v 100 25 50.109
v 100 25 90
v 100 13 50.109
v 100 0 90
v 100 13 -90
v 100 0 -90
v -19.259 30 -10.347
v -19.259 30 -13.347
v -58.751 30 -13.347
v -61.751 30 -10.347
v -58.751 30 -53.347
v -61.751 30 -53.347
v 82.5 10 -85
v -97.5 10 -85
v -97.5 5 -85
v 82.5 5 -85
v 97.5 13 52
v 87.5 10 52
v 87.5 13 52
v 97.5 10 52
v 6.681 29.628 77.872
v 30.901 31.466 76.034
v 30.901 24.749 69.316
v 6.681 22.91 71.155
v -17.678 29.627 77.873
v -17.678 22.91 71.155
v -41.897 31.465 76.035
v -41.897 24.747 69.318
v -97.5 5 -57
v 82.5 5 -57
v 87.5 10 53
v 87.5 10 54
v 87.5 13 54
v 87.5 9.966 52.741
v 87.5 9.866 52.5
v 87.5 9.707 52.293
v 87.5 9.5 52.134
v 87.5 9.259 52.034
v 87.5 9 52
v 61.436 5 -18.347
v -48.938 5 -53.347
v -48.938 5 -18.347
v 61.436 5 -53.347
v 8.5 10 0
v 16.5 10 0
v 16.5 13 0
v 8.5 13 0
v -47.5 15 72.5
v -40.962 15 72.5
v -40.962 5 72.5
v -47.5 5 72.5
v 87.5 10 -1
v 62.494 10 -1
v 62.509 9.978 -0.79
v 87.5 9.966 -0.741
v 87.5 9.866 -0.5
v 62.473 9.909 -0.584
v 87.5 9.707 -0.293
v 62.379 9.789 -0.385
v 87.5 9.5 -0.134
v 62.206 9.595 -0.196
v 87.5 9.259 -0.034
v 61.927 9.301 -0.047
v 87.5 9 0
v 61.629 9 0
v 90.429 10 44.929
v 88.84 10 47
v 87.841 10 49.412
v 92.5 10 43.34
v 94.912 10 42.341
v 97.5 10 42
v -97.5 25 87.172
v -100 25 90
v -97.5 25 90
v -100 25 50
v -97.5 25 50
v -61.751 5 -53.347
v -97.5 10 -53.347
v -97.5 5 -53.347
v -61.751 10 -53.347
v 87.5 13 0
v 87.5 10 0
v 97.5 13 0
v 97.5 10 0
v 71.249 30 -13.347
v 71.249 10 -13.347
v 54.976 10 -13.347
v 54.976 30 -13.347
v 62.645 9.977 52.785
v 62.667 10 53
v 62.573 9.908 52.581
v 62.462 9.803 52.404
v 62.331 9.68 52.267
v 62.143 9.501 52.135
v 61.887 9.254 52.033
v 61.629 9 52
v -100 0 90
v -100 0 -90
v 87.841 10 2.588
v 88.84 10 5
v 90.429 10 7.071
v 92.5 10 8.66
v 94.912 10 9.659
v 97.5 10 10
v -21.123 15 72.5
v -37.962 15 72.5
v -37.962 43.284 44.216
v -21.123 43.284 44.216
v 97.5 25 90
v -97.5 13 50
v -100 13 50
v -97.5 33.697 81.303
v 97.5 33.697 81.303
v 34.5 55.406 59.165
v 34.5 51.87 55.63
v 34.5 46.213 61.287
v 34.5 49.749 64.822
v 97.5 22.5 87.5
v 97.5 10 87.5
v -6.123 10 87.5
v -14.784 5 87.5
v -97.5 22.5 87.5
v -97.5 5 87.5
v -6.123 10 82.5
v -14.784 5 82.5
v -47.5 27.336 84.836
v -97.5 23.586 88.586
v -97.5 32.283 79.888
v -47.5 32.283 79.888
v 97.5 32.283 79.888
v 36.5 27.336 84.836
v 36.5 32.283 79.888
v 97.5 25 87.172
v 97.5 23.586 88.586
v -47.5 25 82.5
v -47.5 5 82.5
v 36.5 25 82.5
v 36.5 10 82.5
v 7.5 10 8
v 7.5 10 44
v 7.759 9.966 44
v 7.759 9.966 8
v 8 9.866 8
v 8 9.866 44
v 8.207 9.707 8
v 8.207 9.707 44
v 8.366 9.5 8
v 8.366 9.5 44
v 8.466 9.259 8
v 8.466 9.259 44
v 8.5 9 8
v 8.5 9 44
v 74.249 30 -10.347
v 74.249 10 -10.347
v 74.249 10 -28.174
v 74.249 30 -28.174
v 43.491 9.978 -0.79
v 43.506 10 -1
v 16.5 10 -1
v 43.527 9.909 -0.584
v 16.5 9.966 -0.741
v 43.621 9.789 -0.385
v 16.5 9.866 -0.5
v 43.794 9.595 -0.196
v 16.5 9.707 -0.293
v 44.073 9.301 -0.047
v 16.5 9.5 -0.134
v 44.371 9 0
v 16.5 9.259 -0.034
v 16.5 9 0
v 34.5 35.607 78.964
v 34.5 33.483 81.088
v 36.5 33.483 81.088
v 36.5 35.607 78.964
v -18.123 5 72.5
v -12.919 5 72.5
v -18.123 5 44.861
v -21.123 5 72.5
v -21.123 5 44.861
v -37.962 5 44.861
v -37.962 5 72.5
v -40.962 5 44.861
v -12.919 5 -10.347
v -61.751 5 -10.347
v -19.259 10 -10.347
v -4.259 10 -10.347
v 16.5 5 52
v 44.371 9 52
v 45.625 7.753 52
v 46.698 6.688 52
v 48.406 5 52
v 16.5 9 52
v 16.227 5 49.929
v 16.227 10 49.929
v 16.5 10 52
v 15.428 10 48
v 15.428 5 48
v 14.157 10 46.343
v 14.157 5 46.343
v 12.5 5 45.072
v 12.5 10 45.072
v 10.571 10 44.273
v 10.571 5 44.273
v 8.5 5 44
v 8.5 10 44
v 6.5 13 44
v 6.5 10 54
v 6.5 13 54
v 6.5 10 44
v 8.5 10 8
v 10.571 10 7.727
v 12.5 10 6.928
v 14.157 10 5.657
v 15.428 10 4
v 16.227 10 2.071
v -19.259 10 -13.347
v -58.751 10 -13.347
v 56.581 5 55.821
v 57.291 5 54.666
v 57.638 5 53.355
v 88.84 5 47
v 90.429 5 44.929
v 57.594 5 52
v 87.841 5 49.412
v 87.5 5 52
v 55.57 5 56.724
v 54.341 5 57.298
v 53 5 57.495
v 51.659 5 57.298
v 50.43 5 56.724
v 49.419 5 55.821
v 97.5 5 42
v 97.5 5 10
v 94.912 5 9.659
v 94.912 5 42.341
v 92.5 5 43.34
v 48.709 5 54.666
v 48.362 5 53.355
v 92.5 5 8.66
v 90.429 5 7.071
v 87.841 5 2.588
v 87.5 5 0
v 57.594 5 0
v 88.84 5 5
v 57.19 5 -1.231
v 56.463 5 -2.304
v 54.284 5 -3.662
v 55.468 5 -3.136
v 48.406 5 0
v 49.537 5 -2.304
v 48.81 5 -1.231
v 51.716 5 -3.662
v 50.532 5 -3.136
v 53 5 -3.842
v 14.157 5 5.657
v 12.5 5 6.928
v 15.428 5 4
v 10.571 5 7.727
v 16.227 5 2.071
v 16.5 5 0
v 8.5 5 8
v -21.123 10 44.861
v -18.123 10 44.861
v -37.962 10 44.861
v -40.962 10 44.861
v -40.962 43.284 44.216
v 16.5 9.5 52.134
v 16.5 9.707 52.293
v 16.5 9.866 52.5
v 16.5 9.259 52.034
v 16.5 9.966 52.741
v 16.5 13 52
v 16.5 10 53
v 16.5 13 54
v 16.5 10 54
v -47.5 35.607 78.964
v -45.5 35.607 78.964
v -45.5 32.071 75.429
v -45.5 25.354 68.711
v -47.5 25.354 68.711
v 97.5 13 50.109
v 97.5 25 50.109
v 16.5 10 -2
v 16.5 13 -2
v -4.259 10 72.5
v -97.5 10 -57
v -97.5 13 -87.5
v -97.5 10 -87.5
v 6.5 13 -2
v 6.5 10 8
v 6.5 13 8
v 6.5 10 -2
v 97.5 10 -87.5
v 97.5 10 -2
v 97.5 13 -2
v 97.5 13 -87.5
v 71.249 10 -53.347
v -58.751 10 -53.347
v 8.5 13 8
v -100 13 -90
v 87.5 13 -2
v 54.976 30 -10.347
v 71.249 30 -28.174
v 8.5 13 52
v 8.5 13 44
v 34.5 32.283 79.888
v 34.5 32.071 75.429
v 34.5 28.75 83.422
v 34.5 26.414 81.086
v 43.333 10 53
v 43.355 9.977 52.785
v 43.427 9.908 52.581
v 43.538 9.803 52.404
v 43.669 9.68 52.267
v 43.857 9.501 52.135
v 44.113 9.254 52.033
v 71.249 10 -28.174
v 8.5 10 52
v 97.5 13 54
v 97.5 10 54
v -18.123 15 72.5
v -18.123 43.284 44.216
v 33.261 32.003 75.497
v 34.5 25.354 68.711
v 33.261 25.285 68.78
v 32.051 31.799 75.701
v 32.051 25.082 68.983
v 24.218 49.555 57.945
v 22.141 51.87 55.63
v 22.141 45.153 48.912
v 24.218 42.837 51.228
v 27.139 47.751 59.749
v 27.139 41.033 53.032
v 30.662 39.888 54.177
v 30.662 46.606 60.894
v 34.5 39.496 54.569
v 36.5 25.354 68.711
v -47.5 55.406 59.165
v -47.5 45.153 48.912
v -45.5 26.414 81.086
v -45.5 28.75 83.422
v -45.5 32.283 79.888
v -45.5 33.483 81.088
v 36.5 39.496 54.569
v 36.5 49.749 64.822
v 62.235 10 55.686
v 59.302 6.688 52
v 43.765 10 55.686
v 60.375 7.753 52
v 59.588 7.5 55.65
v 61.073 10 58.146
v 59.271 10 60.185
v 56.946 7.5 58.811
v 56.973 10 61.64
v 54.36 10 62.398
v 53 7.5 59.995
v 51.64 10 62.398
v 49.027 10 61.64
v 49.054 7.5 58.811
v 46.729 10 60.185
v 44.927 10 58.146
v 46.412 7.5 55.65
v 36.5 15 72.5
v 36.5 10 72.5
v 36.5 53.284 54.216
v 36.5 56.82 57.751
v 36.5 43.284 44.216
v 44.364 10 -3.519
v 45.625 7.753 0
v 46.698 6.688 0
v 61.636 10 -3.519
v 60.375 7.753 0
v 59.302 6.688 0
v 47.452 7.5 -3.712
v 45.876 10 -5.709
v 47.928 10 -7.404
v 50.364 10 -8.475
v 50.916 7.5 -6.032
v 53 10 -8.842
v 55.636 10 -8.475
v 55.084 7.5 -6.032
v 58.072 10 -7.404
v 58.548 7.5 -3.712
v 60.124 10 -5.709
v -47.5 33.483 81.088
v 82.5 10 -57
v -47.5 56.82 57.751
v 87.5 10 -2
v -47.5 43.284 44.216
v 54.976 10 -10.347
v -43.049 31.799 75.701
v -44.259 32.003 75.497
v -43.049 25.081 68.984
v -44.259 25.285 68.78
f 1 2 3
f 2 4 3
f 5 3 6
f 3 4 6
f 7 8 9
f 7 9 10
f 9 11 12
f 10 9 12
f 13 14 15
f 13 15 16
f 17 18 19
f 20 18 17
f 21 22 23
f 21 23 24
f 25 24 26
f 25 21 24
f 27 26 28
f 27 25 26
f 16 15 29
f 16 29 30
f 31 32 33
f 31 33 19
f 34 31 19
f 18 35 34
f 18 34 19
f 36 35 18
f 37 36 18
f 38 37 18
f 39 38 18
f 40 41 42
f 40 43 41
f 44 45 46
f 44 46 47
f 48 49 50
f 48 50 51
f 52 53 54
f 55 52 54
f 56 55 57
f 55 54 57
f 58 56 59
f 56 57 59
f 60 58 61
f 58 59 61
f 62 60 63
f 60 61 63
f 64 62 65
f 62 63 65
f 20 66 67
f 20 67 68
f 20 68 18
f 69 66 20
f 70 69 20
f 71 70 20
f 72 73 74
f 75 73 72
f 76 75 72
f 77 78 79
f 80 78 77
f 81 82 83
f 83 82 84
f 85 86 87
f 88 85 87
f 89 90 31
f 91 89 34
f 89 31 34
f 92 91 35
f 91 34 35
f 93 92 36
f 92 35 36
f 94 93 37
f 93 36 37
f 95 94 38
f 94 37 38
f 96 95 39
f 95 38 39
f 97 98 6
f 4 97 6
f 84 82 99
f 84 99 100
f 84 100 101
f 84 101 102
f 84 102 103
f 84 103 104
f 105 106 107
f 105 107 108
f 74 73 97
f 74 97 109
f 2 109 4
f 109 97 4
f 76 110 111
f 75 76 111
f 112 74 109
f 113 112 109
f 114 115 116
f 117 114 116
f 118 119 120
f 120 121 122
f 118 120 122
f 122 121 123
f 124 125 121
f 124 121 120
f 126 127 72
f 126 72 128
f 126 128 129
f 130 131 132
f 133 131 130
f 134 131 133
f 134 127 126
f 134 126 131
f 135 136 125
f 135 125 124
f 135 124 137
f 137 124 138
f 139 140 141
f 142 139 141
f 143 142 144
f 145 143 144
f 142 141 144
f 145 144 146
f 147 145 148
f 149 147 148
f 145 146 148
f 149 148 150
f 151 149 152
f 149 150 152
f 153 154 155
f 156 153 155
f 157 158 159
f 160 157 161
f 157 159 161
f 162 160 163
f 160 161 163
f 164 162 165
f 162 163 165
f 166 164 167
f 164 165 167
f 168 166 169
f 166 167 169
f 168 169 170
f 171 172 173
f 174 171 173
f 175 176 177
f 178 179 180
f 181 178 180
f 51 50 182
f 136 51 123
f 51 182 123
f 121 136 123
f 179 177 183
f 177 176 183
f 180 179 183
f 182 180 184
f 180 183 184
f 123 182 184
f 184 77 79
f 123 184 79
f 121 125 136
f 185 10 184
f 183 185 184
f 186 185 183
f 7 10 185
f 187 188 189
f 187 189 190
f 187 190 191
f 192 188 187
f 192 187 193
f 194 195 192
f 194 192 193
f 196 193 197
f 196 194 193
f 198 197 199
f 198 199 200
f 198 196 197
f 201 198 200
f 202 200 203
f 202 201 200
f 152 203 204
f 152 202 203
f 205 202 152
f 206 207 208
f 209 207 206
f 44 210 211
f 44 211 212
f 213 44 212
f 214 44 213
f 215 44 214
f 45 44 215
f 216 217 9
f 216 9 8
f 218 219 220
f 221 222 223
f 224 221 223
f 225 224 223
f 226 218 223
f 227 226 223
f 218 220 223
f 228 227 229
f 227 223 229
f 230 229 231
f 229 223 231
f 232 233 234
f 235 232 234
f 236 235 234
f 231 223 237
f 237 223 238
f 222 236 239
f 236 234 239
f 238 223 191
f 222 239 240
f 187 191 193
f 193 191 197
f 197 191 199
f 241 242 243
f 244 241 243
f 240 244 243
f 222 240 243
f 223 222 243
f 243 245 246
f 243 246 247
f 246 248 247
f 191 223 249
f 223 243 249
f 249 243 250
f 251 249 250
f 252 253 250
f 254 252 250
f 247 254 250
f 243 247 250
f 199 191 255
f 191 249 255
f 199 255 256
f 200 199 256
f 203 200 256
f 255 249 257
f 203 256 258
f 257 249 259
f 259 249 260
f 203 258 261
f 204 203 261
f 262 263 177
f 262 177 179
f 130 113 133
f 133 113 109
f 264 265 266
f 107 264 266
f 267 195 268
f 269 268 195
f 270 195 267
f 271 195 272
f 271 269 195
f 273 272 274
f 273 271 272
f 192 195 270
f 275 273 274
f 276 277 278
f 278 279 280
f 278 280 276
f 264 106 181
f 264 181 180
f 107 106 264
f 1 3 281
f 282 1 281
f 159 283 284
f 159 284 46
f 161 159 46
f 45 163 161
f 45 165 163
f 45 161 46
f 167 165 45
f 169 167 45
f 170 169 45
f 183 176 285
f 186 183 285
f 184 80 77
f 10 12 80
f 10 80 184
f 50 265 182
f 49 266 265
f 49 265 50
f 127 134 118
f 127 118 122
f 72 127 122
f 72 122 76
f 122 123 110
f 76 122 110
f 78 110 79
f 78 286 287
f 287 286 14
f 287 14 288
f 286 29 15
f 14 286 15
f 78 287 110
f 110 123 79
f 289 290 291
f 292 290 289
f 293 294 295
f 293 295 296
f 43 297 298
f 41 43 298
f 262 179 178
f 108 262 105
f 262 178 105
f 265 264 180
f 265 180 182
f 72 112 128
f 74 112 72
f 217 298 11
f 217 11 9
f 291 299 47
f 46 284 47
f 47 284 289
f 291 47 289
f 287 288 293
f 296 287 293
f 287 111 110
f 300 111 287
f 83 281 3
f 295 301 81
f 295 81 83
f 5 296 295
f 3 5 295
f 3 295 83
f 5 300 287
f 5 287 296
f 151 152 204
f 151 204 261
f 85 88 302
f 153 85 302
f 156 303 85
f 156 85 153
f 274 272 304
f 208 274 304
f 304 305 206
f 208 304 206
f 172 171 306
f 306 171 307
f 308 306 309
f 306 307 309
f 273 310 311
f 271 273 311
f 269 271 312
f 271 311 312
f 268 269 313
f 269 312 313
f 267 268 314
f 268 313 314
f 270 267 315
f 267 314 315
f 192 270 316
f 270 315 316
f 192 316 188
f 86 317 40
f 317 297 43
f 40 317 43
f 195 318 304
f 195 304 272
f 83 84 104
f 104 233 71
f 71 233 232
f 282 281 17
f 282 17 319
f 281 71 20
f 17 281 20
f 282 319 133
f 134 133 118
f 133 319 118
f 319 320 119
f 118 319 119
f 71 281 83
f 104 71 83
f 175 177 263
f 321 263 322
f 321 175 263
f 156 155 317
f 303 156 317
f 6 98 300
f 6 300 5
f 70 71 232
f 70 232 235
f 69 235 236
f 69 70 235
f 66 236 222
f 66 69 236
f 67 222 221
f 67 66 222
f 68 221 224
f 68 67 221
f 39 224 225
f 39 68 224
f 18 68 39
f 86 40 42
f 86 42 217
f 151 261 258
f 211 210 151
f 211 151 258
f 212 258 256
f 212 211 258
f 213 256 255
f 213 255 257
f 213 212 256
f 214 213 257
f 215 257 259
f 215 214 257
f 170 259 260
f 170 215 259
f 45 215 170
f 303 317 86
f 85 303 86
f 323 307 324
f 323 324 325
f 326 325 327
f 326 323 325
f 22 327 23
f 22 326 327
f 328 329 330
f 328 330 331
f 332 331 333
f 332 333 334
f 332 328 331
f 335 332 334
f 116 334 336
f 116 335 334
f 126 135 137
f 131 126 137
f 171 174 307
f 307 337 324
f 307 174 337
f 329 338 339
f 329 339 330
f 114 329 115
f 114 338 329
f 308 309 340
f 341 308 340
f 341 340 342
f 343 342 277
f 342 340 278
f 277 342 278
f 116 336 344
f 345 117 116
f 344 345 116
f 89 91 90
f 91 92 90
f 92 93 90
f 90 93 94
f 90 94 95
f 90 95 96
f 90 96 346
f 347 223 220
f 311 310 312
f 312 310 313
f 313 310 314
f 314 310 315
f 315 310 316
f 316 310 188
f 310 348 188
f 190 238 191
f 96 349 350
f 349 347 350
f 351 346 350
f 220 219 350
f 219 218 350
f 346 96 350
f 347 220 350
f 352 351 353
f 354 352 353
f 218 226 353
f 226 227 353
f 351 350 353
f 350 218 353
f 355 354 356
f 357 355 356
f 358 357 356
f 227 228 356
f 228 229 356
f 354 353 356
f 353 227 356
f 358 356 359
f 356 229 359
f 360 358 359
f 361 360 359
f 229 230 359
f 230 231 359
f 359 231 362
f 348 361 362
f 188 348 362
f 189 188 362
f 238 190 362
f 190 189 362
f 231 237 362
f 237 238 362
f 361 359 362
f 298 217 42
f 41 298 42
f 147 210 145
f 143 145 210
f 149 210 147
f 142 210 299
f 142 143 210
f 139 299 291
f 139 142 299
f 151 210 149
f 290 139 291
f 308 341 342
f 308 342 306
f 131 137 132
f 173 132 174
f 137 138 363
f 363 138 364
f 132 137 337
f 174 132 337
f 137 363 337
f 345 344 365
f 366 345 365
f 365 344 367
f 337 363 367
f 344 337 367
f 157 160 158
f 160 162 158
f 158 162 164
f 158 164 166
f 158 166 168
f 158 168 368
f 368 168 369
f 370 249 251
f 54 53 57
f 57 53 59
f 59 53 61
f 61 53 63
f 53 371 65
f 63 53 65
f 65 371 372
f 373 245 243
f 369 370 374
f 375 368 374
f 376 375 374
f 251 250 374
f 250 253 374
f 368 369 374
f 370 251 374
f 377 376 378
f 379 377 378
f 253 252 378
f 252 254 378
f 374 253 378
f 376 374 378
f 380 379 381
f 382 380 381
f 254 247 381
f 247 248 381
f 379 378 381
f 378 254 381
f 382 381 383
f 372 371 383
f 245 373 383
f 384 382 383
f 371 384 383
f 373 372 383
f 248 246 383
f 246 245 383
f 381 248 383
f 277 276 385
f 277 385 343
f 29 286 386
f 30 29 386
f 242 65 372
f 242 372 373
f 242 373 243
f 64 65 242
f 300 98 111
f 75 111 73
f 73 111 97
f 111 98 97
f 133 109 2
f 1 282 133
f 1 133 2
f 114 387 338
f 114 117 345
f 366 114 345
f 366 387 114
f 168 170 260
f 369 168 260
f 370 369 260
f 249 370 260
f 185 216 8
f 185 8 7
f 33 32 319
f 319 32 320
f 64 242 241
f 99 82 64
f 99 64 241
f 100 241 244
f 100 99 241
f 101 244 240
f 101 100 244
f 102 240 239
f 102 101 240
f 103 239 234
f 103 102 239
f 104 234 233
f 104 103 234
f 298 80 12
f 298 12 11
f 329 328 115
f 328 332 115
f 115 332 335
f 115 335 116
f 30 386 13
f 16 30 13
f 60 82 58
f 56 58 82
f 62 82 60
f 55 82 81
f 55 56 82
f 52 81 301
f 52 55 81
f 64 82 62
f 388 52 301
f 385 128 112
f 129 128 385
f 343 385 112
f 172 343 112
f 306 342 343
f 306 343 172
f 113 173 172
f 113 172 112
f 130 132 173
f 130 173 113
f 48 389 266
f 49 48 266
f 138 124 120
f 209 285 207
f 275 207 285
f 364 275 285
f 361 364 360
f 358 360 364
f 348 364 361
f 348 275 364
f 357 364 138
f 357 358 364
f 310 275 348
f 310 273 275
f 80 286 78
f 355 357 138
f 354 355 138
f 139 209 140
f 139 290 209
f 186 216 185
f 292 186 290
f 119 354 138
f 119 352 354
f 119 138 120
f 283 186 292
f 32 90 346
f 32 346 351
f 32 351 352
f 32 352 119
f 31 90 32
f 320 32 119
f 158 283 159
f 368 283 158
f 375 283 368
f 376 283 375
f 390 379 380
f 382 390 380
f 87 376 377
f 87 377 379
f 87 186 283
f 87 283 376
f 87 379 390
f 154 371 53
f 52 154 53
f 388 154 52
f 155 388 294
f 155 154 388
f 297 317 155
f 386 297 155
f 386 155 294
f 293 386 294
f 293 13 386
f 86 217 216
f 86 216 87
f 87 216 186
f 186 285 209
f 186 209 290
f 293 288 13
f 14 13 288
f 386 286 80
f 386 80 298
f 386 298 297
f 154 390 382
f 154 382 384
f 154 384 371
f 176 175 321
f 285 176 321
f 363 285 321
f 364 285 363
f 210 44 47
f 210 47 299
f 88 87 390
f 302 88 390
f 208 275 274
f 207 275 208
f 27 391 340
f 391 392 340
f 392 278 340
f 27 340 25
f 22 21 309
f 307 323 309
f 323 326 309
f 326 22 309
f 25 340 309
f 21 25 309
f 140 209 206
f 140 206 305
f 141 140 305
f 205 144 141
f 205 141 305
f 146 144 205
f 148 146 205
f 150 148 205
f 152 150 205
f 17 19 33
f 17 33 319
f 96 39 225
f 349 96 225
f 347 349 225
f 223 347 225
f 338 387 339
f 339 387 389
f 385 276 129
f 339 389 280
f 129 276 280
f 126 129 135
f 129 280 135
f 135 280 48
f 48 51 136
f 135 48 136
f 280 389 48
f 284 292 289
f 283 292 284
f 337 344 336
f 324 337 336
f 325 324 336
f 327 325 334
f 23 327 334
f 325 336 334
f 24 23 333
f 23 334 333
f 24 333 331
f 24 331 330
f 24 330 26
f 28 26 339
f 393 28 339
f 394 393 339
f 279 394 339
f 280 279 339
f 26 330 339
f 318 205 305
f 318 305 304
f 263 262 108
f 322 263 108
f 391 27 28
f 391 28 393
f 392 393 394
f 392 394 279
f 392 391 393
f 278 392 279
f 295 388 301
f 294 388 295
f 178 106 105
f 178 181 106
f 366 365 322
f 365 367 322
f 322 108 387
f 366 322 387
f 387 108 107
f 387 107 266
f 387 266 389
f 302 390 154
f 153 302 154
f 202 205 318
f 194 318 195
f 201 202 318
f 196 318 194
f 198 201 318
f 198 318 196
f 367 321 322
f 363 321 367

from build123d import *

# Parameters (mm, degrees)
SKETCH1_W            = 200
SKETCH1_H            = 180
BOSS_EXTRUDE1_DEPTH  = 10
SKETCH2_W            = 200
SKETCH2_H            = 180
SKETCH2_W_2          = 195
SKETCH2_H_2          = 175
BOSS_EXTRUDE2_DEPTH  = 3
SKETCH11_W           = 180
SKETCH11_H           = 28
CUT_EXTRUDE4_DEPTH   = 8
BOSS_EXTRUDE6_DEPTH  = 20
SKETCH4_W            = 10
SKETCH4_H            = 2
BOSS_EXTRUDE3_DEPTH  = 3
CUT_EXTRUDE1_DEPTH   = 5
CHAMFER1_SIZE        = 5
FILLET1_R            = 1
SKETCH7_W            = 84
SKETCH7_H            = 10
BOSS_EXTRUDE4_DEPTH  = 15
CHAMFER2_SIZE        = 10
SKETCH8_W            = 84
SKETCH8_H            = 14.142135624
BOSS_EXTRUDE5_DEPTH  = 40
BOSS_EXTRUDE12_DEPTH = 5
CUT_EXTRUDE5_DEPTH   = 9.5
LOFT2_START          = -40.961892057
LOFT2_DEPTH          = 3
LOFT3_START          = 61.722133944
LOFT3_OUTLINE_W      = 3
LOFT3_OUTLINE_H      = 43.678858874
LOFT3_DEPTH          = 4.277866056
LOFT5_START          = -40.961892057
LOFT5_DEPTH          = 3
LOFT6_START          = -21.123339187
LOFT6_DEPTH          = 3
SKETCH32_W           = 110
SKETCH32_H           = 35
CUT_EXTRUDE6_DEPTH   = 5
CHAMFER6_START       = -10.346513917
CHAMFER6_DEPTH       = 82.846513917
CHAMFER6_2_OUTLINE_W = 1.135860263
CHAMFER6_2_OUTLINE_H = 5
CHAMFER6_2_DEPTH     = 55.207581741
CHAMFER6_START_2     = 82.5
CHAMFER6_3_DEPTH     = 5
CHAMFER8_SIZE        = 5
BOSS_EXTRUDE13_DEPTH = 12
CHAMFER5_SIZE        = 2.5
SKETCH25_W           = 195
SKETCH25_H           = 2
BOSS_EXTRUDE14_DEPTH = 12.3
BOSS_EXTRUDE15_DEPTH = 10


with BuildPart() as part:
    # Sketch1 → Boss-Extrude1 (new body)
    with BuildSketch(Plane(origin=(0, 0, 0), x_dir=(1, 0, 0), z_dir=(0, 1, 0))):
        Rectangle(SKETCH1_W, SKETCH1_H)
    extrude(amount=BOSS_EXTRUDE1_DEPTH)

    # Sketch2 → Boss-Extrude2 (add)
    with BuildSketch(Plane(origin=(0, 10, 0), x_dir=(1, 0, 0), z_dir=(0, 1, 0))):
        Rectangle(SKETCH2_W, SKETCH2_H)
        Rectangle(SKETCH2_W_2, SKETCH2_H_2, mode=Mode.SUBTRACT)
    extrude(amount=BOSS_EXTRUDE2_DEPTH)

    # Sketch11 → Cut-Extrude4 (cut)
    with BuildSketch(Plane(origin=(0, 13, 0), x_dir=(1, 0, 0), z_dir=(0, 1, 0))):
        with Locations((-7.5, 71)):
            Rectangle(SKETCH11_W, SKETCH11_H)
    extrude(amount=-CUT_EXTRUDE4_DEPTH, mode=Mode.SUBTRACT)

    # Sketch12 → Boss-Extrude6 (add)
    with BuildSketch(Plane(origin=(0, 10, 0), x_dir=(1, 0, 0), z_dir=(0, 1, 0))):
        Polygon((-58.75108786, 53.346513917), (-58.75108786, 13.346513917), (-19.25919945, 13.346513917), (-19.25919945, 10.346513917), (-61.75108786, 10.346513917), (-61.75108786, 53.346513917), align=None)
        Polygon((71.24891214, 28.173917959), (71.24891214, 13.346513917), (54.976322897, 13.346513917), (54.976322897, 10.346513917), (74.24891214, 10.346513917), (74.24891214, 28.173917959), align=None)
    extrude(amount=BOSS_EXTRUDE6_DEPTH)

    # Sketch4 → Boss-Extrude3 (add)
    with BuildSketch(Plane(origin=(0, 10, 0), x_dir=(1, 0, 0), z_dir=(0, 1, 0))):
        Polygon((8.5, 0), (8.5, -8), (6.5, -8), (6.5, 2), (16.5, 2), (16.5, 0), align=None)
        Polygon((16.5, -52), (16.5, -54), (6.5, -54), (6.5, -44), (8.5, -44), (8.5, -52), align=None)
        with Locations((92.5, 1)):
            Rectangle(SKETCH4_W, SKETCH4_H)
        with Locations((92.5, -53)):
            Rectangle(SKETCH4_W, SKETCH4_H)
    extrude(amount=BOSS_EXTRUDE3_DEPTH)

    # Sketch5 → Cut-Extrude1 (cut)
    with BuildSketch(Plane(origin=(0, 10, 0), x_dir=(1, 0, 0), z_dir=(0, 1, 0))):
        with BuildLine():
            Line((16.5, 0), (48.405541733, 0))
            ThreePointArc((48.405541733, 0), (53, 3.841715626), (57.594458267, 0))
            Line((57.594458267, 0), (87.5, 0))
            ThreePointArc((87.5, 0), (90.428932188, -7.071067812), (97.5, -10))
            Line((97.5, -10), (97.5, -42))
            ThreePointArc((97.5, -42), (90.428932188, -44.928932188), (87.5, -52))
            Line((87.5, -52), (57.594458267, -52))
            ThreePointArc((57.594458267, -52), (53, -57.494692689), (48.405541733, -52))
            Line((48.405541733, -52), (16.5, -52))
            ThreePointArc((16.5, -52), (14.156854249, -46.343145751), (8.5, -44))
            Line((8.5, -44), (8.5, -8))
            ThreePointArc((8.5, -8), (14.156854249, -5.656854249), (16.5, 0))
        make_face()
    extrude(amount=-CUT_EXTRUDE1_DEPTH, mode=Mode.SUBTRACT)

    # Chamfer1
    chamfer1_edges = [part.edges().sort_by_distance(p)[0] for p in [
        (53, 10, -3.841715626),
        (53, 10, 57.494692689),
    ]]
    chamfer(chamfer1_edges, length=CHAMFER1_SIZE - 0.0001)  # a hair under: the kernel refuses the full size

    # Fillet1
    # the kernel refuses this fillet: 1 mm, written as the material it takes off along each edge
    with BuildSketch(Plane(origin=(8.5, 10, 44), x_dir=(-1, 0, 0), z_dir=(0, 0, -1))) as fillet1_piece_1:
        with BuildLine():
            CenterArc((FILLET1_R, -FILLET1_R), FILLET1_R, 90, 90)
            Line((0, -FILLET1_R), (0, 0))
            Line((0, 0), (FILLET1_R, 0))
        make_face()
    extrude(amount=36, mode=Mode.SUBTRACT)
    with BuildSketch(Plane(origin=(45.867287261, 10, 52), x_dir=(0, 0, 1), z_dir=(-1, 0, 0)), Plane(origin=(16.5, 10, 0), x_dir=(0, 0, -1), z_dir=(1, 0, 0))) as fillet1_piece_2:
        with BuildLine():
            CenterArc((FILLET1_R, -FILLET1_R), FILLET1_R, 90, 90)
            Line((0, -FILLET1_R), (0, 0))
            Line((0, 0), (FILLET1_R, 0))
        make_face()
    extrude(amount=29.367287261, mode=Mode.SUBTRACT)
    with BuildSketch(Plane(origin=(87.5, 10, 52), x_dir=(0, 0, 1), z_dir=(-1, 0, 0)), Plane(origin=(60.132712739, 10, 0), x_dir=(0, 0, -1), z_dir=(1, 0, 0))) as fillet1_piece_3:
        with BuildLine():
            CenterArc((FILLET1_R, -FILLET1_R), FILLET1_R, 90, 90)
            Line((0, -FILLET1_R), (0, 0))
            Line((0, 0), (FILLET1_R, 0))
        make_face()
    extrude(amount=27.367287261, mode=Mode.SUBTRACT)

    # Sketch7 → Boss-Extrude4 (add)
    with BuildSketch(Plane(origin=(0, 10, 0), x_dir=(1, 0, 0), z_dir=(0, 1, 0))):
        with Locations((-5.5, -77.5)):
            Rectangle(SKETCH7_W, SKETCH7_H)
    extrude(amount=BOSS_EXTRUDE4_DEPTH)

    # Chamfer2
    chamfer2_edges = [part.edges().sort_by_distance(p)[0] for p in [
        (-5.5, 25, 72.5),
    ]]
    chamfer(chamfer2_edges, length=CHAMFER2_SIZE - 0.0001)  # a hair under: the kernel refuses the full size

    # Sketch8 → Boss-Extrude5 (add)
    with BuildSketch(Plane(origin=(0, -28.75, 28.75), x_dir=(1, 0, 0), z_dir=(0, 0.7071067811865446, -0.7071067811865506))):
        with Locations((-5.5, -68.942911166)):
            Rectangle(SKETCH8_W, SKETCH8_H)
    extrude(amount=BOSS_EXTRUDE5_DEPTH)

    # Sketch22 → Boss-Extrude12 (add)
    with BuildSketch(Plane(origin=(0, 53.75, 53.75), x_dir=(1, 0, 0), z_dir=(0, 0.7071067811865507, 0.7071067811865446))):
        Polygon((-47.5, -0.658639918), (-47.5, -2.658639918), (-45.5, -2.658639918), (34.5, -2.658639918), (34.5, -10.658639918), (36.5, -10.658639918), (36.5, -0.658639918), align=None)
        Polygon((-47.5, -40.658639918), (36.5, -40.658639918), (36.5, -30.658639918), (34.5, -30.658639918), (34.5, -38.658639918), (-45.5, -38.658639918), (-45.5, -30.658639918), (-47.5, -30.658639918), align=None)
    extrude(amount=BOSS_EXTRUDE12_DEPTH)

    # Sketch23 → Cut-Extrude5 (cut)
    with BuildSketch(Plane(origin=(0, 53.75, 53.75), x_dir=(1, 0, 0), z_dir=(0, 0.7071067811865507, 0.7071067811865446))):
        with BuildLine():
            Line((-47.5, -2.658639918), (14.408313461, -2.658639918))
            Line((14.408313461, -2.658639918), (22.14057939, -2.658639918))
            ThreePointArc((22.14057939, -2.658639918), (27.138694447, -8.484119002), (34.5, -10.658639918))
            Line((34.5, -10.658639918), (36.5, -10.658639918))
            Line((36.5, -10.658639918), (36.5, -30.658639918))
            Line((36.5, -30.658639918), (34.5, -30.658639918))
            ThreePointArc((34.5, -30.658639918), (32.65013037, -30.875454044), (30.900530206, -31.514144331))
            ThreePointArc((30.900530206, -31.514144331), (-5.498259382, -34.440048812), (-41.897184507, -31.515830911))
            ThreePointArc((-41.897184507, -31.515830911), (-43.648307809, -30.875887447), (-45.5, -30.658639918))
            Line((-45.5, -30.658639918), (-47.5, -30.658639918))
            Line((-47.5, -30.658639918), (-47.5, -2.658639918))
        make_face()
    extrude(amount=-CUT_EXTRUDE5_DEPTH, mode=Mode.SUBTRACT)

    # Loft2: read off the stored shape, not the designer's step
    # Loft2 outline → Loft2 (add)
    with BuildSketch(Plane.YZ.offset(LOFT2_START)):
        Polygon((10, 72.5), (43.284271247, 44.215728753), (15, 72.5), align=None)
    extrude(amount=LOFT2_DEPTH)

    # Loft3: read off the stored shape, not the designer's step
    # Loft3 outline → Loft3 (add)
    with BuildSketch(Plane(origin=(0, 0, 0), x_dir=(1, 0, 0), z_dir=(0, 0.6475505994673441, 0.7620224544785301)).offset(LOFT3_START)):
        with Locations((-19.623339187, -17.48776448)):
            Rectangle(LOFT3_OUTLINE_W, LOFT3_OUTLINE_H)
    extrude(amount=LOFT3_DEPTH)

    # Loft5: read off the stored shape, not the designer's step
    # Loft5 outline → Loft5 (add)
    with BuildSketch(Plane.YZ.offset(LOFT5_START)):
        Polygon((10, 44.861067824), (43.284271247, 44.215728753), (10, 72.5), align=None)
    extrude(amount=LOFT5_DEPTH)

    # Loft6: read off the stored shape, not the designer's step
    # Loft6 outline → Loft6 (add)
    with BuildSketch(Plane.YZ.offset(LOFT6_START)):
        Polygon((10, 44.861067824), (43.284271247, 44.215728753), (10, 72.5), align=None)
    extrude(amount=LOFT6_DEPTH)

    # Sketch32 → Cut-Extrude6 (cut)
    with BuildSketch(Plane(origin=(0, 10, 0), x_dir=(1, 0, 0), z_dir=(0, 1, 0))):
        Polygon((-97.5, -87.5), (-97.5, 53.346513917), (-61.75108786, 53.346513917), (-61.75108786, 10.346513917), (-19.25919945, 10.346513917), (-19.25919945, -44.861067824), (-21.123339187, -44.861067824), (-21.123339187, -72.5), (-37.961892057, -72.5), (-37.961892057, -44.861067824), (-40.961892057, -44.861067824), (-40.961892057, -72.5), (-47.5, -72.5), (-47.5, -82.5), (-21.123339187, -82.5), (-21.123339187, -87.5), align=None)
        with Locations((6.24891214, 35.846513917)):
            Rectangle(SKETCH32_W, SKETCH32_H)
    extrude(amount=-CUT_EXTRUDE6_DEPTH, mode=Mode.SUBTRACT)

    # Chamfer6: read off the stored shape, not the designer's step
    # Chamfer6 outline → Chamfer6 (cut)
    with BuildSketch(Plane.XY.offset(CHAMFER6_START)):
        Polygon((-18.123339187, 10), (-18.123339187, 5), (-12.919453488, 5), (-4.25919945, 10), align=None)
    extrude(amount=CHAMFER6_DEPTH, mode=Mode.SUBTRACT)

    # Chamfer6 2 outline → Chamfer6 2 (cut)
    with BuildSketch(Plane.XY.offset(CHAMFER6_START)):
        with Locations((-18.691269319, 7.5)):
            Rectangle(CHAMFER6_2_OUTLINE_W, CHAMFER6_2_OUTLINE_H)
    extrude(amount=CHAMFER6_2_DEPTH, mode=Mode.SUBTRACT)

    # Chamfer6 3 outline → Chamfer6 3 (cut)
    with BuildSketch(Plane.XY.offset(CHAMFER6_START_2)):
        Polygon((-14.783593225, 5), (-6.123339187, 10), (-21.123339187, 10), (-21.123339187, 5), align=None)
    extrude(amount=CHAMFER6_3_DEPTH, mode=Mode.SUBTRACT)

    # Chamfer7
    # the kernel refuses this chamfer: 10, 5.095254495 mm, written as the material it takes off along each edge
    with BuildSketch(Plane(origin=(-48.75108786, 10, -18.346513917), x_dir=(-1, 0, 0), z_dir=(0, 0, -1))) as chamfer7_piece_1_section:
        with BuildLine():
            Line((10.35640261, 0.1815962), (-0.35640261, -5.276850695))
            Line((-0.35640261, -5.276850695), (-0.55640261, -5.276850695))
            ThreePointArc((-0.55640261, -5.276850695), (-0.2, -2.638425347), (-0.2, 0))
            Line((-0.2, 0), (0, 0.2))
            ThreePointArc((0, 0.2), (5.178201305, 0.2), (10.35640261, 0.3815962))
            Line((10.35640261, 0.3815962), (10.35640261, 0.1815962))
        make_face()
    chamfer7_piece_1 = extrude(amount=35, mode=Mode.PRIVATE)
    chamfer7_piece_1 = split(chamfer7_piece_1, bisect_by=Plane(origin=(-58.75108786, 10, -18.346513917), z_dir=(1, 0, 0)), keep=Keep.TOP, mode=Mode.PRIVATE)
    chamfer7_piece_1 = split(chamfer7_piece_1, bisect_by=Plane(origin=(-48.75108786, 5, -18.346513917), z_dir=(0, 1, 0)), keep=Keep.TOP, mode=Mode.PRIVATE)
    add(chamfer7_piece_1, mode=Mode.SUBTRACT)
    with BuildSketch(Plane(origin=(61.24891214, 10, -53.346513917), x_dir=(1, 0, 0), z_dir=(0, 0, 1))) as chamfer7_piece_2_section:
        with BuildLine():
            Line((10.35640261, 0.1815962), (-0.35640261, -5.276850695))
            Line((-0.35640261, -5.276850695), (-0.55640261, -5.276850695))
            ThreePointArc((-0.55640261, -5.276850695), (-0.2, -2.638425347), (-0.2, 0))
            Line((-0.2, 0), (0, 0.2))
            ThreePointArc((0, 0.2), (5.178201305, 0.2), (10.35640261, 0.3815962))
            Line((10.35640261, 0.3815962), (10.35640261, 0.1815962))
        make_face()
    chamfer7_piece_2 = extrude(amount=35, mode=Mode.PRIVATE)
    chamfer7_piece_2 = split(chamfer7_piece_2, bisect_by=Plane(origin=(71.24891214, 10, -53.346513917), z_dir=(-1, 0, 0)), keep=Keep.TOP, mode=Mode.PRIVATE)
    chamfer7_piece_2 = split(chamfer7_piece_2, bisect_by=Plane(origin=(61.24891214, 5, -53.346513917), z_dir=(0, 1, 0)), keep=Keep.TOP, mode=Mode.PRIVATE)
    add(chamfer7_piece_2, mode=Mode.SUBTRACT)

    # Chamfer8
    chamfer8_edges = [part.edges().sort_by_distance(p)[0] for p in [
        (6.24891214, 10, -18.346513917),
    ]]
    chamfer(chamfer8_edges, length=CHAMFER8_SIZE - 0.0001)  # a hair under: the kernel refuses the full size

    # Sketch24 → Boss-Extrude13 (add)
    with BuildSketch(Plane(origin=(0, 13, 0), x_dir=(1, 0, 0), z_dir=(0, 1, 0))):
        Polygon((-100, -90), (100, -90), (100, -50.108827803), (97.5, -50.108827803), (97.5, -87.5), (-97.5, -87.5), (-97.5, -50), (-100, -50), align=None)
    extrude(amount=BOSS_EXTRUDE13_DEPTH)

    # Chamfer5
    chamfer5_edges = [part.edges().sort_by_distance(p)[0] for p in [
        (0, 25, 87.5),
    ]]
    chamfer(chamfer5_edges, length=CHAMFER5_SIZE - 0.0001)  # a hair under: the kernel refuses the full size

    # Sketch25 → Boss-Extrude14 (add)
    with BuildSketch(Plane(origin=(0, -32.5, 32.5), x_dir=(1, 0, 0), z_dir=(0, 0.7071067811865408, -0.7071067811865543))):
        with Locations((0, -80.317279836)):
            Rectangle(SKETCH25_W, SKETCH25_H)
    extrude(amount=BOSS_EXTRUDE14_DEPTH)

    # Sketch26 → Boss-Extrude15 (add)
    with BuildSketch(Plane(origin=(0, -23.802586591, 23.802586591), x_dir=(1, 0, 0), z_dir=(0, 0.7071067811865441, -0.707106781186551))):
        Polygon((-97.5, -79.317279836), (-97.5, -81.317279836), (-47.5, -81.317279836), (-45.50354013, -81.317279836), (-41.00354013, -81.317279836), (-41.00354013, -79.317279836), (-45.5, -79.317279836), (-47.5, -79.317279836), align=None)
        Polygon((97.5, -79.317279836), (97.5, -81.317279836), (36.492919741, -81.317279836), (30, -81.317279836), (30, -79.317279836), (34.5, -79.317279836), (36.5, -79.317279836), align=None)
    extrude(amount=-BOSS_EXTRUDE15_DEPTH)


solid = part.part
